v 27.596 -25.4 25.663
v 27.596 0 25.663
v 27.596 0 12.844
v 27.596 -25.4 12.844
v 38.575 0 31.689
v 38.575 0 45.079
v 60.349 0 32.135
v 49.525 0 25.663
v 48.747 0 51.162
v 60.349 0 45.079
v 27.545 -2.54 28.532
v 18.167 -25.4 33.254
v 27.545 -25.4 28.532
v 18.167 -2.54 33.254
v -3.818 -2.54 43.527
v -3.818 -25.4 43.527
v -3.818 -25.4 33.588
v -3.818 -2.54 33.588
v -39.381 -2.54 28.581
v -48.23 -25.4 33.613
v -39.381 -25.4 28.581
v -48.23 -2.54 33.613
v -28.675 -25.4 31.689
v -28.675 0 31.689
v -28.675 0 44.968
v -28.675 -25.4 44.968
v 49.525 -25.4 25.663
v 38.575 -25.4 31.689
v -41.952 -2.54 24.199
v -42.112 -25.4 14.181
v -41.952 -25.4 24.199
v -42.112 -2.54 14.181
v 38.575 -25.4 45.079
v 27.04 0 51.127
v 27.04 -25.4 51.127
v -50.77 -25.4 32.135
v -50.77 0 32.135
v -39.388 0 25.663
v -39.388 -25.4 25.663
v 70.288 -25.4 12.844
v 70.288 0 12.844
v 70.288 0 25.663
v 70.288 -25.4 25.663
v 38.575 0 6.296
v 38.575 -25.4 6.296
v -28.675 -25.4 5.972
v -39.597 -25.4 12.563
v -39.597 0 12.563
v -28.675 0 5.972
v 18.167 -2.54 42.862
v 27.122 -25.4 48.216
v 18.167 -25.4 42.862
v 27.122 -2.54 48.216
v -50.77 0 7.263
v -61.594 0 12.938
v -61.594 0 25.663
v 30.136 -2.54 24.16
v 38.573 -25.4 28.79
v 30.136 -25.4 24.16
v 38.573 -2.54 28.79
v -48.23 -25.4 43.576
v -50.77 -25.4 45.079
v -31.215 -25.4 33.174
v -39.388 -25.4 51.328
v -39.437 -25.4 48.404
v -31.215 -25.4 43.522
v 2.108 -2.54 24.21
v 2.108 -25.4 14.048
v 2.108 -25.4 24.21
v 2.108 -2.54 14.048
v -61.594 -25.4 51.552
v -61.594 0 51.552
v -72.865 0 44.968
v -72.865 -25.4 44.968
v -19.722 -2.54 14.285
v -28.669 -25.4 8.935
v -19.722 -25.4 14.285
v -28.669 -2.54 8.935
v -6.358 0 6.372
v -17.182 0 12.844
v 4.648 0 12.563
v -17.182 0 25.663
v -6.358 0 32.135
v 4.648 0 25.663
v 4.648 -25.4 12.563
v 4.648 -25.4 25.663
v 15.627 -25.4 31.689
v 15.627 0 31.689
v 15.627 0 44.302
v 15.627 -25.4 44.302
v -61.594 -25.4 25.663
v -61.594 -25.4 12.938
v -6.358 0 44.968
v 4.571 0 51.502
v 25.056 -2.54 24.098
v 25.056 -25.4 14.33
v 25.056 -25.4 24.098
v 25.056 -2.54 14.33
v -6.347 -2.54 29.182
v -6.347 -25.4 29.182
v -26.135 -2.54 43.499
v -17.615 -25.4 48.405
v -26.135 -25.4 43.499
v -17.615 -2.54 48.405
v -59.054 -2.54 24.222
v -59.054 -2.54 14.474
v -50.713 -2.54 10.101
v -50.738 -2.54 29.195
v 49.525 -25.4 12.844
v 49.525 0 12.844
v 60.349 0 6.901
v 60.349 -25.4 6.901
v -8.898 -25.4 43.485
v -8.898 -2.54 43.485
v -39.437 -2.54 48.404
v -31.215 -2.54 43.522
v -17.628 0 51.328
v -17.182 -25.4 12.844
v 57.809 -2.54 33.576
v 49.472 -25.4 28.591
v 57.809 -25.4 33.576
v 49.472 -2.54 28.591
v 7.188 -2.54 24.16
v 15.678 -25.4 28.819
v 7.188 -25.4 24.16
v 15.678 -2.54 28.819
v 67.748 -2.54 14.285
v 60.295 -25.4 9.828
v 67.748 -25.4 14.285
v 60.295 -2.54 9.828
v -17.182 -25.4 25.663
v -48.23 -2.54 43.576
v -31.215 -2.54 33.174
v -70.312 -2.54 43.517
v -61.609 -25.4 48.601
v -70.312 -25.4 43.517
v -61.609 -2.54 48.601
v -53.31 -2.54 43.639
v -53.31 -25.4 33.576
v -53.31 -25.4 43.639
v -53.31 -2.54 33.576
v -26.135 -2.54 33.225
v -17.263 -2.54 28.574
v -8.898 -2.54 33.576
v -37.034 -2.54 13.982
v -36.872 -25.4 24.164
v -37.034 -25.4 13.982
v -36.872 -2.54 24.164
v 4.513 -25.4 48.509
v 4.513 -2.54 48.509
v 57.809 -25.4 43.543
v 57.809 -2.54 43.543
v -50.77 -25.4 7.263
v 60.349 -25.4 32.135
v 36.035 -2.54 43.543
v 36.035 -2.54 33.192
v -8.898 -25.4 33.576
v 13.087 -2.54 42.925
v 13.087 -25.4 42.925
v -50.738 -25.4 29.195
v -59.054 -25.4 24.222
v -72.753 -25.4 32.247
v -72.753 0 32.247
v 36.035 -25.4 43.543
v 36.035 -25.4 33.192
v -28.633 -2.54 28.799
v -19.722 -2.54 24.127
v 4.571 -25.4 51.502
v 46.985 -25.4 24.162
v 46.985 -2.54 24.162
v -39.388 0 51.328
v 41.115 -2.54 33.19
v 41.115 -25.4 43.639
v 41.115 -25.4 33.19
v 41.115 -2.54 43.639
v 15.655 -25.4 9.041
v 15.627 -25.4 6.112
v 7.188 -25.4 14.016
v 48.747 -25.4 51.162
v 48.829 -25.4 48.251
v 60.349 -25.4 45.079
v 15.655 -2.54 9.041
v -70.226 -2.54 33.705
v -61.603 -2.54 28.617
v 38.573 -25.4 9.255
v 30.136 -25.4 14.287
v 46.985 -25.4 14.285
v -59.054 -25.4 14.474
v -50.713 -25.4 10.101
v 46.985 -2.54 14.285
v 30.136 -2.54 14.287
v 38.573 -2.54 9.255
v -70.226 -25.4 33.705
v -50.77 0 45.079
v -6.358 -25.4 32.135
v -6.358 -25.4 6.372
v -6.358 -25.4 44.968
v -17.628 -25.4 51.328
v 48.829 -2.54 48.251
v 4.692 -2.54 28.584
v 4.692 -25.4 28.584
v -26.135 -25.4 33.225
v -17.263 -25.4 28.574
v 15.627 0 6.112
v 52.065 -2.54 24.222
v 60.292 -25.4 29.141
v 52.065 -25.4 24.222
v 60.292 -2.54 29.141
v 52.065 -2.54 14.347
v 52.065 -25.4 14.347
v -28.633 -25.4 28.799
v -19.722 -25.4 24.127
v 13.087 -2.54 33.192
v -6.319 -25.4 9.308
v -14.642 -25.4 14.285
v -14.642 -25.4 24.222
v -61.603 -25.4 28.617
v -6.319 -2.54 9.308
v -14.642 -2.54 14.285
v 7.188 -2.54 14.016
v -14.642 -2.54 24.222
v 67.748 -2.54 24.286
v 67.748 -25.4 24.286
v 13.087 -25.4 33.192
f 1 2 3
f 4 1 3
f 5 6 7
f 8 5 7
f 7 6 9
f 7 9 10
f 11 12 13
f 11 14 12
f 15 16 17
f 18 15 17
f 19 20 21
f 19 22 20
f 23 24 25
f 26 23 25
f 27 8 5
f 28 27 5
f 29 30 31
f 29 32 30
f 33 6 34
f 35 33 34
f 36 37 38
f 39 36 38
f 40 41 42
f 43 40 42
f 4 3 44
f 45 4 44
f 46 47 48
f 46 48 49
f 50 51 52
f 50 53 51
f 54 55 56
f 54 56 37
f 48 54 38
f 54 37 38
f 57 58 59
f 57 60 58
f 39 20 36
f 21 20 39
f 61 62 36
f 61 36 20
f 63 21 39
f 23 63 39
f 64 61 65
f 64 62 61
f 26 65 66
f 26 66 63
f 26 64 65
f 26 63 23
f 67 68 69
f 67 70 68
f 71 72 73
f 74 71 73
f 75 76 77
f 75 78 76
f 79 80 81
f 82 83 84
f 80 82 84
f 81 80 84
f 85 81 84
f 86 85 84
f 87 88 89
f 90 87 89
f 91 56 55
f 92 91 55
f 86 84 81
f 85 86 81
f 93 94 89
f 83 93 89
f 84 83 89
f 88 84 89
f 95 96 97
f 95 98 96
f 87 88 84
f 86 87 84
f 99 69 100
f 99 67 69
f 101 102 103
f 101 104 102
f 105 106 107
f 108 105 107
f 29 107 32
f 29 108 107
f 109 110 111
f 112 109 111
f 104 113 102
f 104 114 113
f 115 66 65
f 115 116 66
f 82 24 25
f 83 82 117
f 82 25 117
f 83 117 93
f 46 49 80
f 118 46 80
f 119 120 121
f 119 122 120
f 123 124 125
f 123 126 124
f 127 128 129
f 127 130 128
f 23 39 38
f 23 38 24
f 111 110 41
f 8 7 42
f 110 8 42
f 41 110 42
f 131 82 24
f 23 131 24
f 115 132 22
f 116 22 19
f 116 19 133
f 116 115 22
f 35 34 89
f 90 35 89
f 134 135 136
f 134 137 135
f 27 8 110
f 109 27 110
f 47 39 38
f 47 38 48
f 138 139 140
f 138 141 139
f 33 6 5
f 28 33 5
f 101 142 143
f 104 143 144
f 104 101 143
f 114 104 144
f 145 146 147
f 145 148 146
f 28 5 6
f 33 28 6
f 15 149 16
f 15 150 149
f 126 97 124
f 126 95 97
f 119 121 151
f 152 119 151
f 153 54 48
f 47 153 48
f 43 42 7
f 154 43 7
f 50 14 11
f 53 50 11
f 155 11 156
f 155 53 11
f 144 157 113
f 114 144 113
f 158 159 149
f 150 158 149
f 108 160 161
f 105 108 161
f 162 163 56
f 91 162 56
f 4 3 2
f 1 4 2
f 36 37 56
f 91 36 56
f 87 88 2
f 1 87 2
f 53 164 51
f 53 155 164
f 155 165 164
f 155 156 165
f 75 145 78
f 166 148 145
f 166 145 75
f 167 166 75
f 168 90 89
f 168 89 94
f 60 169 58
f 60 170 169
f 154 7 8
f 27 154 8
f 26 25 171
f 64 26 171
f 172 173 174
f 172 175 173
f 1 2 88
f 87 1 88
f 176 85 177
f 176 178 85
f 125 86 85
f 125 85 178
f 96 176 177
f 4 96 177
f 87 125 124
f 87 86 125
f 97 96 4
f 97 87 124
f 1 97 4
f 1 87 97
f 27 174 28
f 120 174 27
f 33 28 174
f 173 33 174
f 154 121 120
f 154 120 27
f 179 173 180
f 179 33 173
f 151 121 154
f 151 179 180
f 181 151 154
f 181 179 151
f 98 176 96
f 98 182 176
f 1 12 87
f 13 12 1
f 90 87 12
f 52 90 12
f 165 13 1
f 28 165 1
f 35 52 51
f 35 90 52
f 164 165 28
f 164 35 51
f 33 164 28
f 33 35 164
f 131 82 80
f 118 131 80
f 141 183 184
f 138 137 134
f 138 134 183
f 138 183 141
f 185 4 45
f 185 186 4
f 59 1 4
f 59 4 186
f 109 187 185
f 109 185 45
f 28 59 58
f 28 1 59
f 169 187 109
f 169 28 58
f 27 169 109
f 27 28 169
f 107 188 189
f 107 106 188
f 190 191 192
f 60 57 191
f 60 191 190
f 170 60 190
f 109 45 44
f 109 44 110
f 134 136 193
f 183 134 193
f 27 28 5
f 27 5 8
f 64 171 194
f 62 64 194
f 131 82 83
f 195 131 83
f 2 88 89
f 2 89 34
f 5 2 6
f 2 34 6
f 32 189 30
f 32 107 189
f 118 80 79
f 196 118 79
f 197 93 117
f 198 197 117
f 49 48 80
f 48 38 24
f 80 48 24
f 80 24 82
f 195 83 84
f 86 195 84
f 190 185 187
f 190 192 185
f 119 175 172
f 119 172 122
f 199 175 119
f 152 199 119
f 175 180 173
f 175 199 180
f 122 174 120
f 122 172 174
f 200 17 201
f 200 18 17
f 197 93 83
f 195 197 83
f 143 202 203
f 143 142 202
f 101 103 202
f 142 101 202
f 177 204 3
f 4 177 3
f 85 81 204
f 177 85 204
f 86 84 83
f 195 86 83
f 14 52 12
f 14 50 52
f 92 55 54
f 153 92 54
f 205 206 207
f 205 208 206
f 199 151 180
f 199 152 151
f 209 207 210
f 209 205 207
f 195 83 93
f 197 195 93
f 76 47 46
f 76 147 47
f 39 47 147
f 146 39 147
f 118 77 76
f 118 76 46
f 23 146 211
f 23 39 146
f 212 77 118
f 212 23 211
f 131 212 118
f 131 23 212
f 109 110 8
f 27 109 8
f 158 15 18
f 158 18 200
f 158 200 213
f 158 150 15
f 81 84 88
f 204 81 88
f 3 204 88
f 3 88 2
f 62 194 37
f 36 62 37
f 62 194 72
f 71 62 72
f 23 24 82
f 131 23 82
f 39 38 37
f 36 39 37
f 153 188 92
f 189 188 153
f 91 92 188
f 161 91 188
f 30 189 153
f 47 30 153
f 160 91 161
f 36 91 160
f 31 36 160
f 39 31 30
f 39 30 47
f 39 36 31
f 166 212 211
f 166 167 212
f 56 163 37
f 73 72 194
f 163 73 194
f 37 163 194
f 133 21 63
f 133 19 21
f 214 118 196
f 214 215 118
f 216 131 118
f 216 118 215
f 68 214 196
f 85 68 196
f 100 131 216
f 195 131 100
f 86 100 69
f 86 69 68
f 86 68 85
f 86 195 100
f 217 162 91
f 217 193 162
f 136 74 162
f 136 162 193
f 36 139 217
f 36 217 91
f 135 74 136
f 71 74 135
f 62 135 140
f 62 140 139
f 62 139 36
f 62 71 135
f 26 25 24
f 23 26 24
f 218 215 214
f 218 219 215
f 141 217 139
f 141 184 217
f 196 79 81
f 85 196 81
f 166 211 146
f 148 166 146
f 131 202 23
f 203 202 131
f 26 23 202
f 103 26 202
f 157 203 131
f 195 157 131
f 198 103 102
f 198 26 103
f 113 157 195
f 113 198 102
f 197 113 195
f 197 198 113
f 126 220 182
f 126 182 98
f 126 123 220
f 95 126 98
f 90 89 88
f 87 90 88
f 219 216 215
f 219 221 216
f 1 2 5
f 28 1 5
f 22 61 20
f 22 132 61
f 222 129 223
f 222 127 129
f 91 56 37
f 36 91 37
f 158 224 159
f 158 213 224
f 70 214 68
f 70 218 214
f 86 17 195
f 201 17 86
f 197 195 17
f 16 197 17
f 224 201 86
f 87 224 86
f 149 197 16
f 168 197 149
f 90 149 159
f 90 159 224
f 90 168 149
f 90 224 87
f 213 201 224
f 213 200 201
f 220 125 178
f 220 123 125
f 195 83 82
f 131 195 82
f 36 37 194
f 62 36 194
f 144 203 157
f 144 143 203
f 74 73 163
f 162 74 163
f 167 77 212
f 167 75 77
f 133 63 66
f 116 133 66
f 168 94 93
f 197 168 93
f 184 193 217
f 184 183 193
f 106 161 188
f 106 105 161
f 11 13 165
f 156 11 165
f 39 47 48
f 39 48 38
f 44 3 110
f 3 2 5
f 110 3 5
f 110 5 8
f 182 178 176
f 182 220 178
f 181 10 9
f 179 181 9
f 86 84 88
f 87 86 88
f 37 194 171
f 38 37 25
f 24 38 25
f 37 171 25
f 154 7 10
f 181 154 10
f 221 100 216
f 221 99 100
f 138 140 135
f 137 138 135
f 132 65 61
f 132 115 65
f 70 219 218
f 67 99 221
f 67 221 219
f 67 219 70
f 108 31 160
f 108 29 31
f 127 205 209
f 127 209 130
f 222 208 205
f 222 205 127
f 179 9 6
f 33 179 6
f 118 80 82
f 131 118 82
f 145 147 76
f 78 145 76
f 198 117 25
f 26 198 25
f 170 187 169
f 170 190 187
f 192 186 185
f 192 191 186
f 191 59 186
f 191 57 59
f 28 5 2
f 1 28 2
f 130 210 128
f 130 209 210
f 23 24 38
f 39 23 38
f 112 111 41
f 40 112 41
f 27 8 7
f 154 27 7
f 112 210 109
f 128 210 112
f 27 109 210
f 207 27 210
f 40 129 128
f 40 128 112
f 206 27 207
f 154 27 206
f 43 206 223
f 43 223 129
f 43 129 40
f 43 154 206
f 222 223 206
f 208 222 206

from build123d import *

# Parameters (mm, degrees)
F1_DEPTH = 25.4
F2_T     = -2.54
F2_2_T   = -2.54
F2_3_T   = -2.54
F2_4_T   = -2.54
F3_DEPTH = 25.4
F4_T     = -2.54
F4_2_T   = -2.54
F5_DEPTH = 25.4
F6_T     = -2.54
F6_2_T   = -2.54
F6_3_T   = -2.54
F7_DEPTH = 25.4
F8_T     = -2.54
F8_2_T   = -2.54
F8_3_T   = -2.54


with BuildPart() as f1:
    # F0 (on Front) → F1 (new body)
    with BuildSketch(Plane.XZ):
        Polygon((-61.5940727293, 51.5516251326), (-72.864562273, 44.9678711593), (-72.7529749274, 32.2467274964), (-61.5940727293, 25.6629791111), (-50.7699437439, 32.1351401508), (-50.7699437439, 45.0794622302), align=None)
    extrude(amount=F1_DEPTH)

    # F2
    f2_openings = [f1.faces().sort_by_distance(p)[0] for p in [
        (-61.74627, -25.4, 38.618194),
    ]]
    offset(amount=F2_T, openings=f2_openings)


with BuildPart() as f1b:
    # F0 (on Front) → F1, piece 2 (new body)
    with BuildSketch(Plane.XZ):
        Polygon((60.3489740883, 32.1351401508), (49.5248446372, 25.6629791111), (49.5248446372, 12.8440149128), (60.3489740883, 6.9012749916), (70.2876925175, 12.8440149128), (70.2876925175, 25.6629791111), align=None)
    extrude(amount=F1_DEPTH)

    # F2#4
    f2_4_openings = [f1b.faces().sort_by_distance(p)[0] for p in [
        (59.954413, -25.4, 19.400246),
    ]]
    offset(amount=F2_4_T, openings=f2_4_openings)


with BuildPart() as f1c:
    # F0 (on Front) → F1, piece 3 (new body)
    with BuildSketch(Plane.XZ):
        Polygon((27.0402601768, 51.1265959709), (15.6271588057, 44.3022660911), (15.6271588057, 31.6887833178), (27.5959409939, 25.6629791111), (38.5746085251, 31.6887833178), (38.5746085251, 45.0794622302), align=None)
    extrude(amount=F1_DEPTH)

    # F2#3
    f2_3_openings = [f1c.faces().sort_by_distance(p)[0] for p in [
        (27.200622, -25.4, 38.305136),
    ]]
    offset(amount=F2_3_T, openings=f2_3_openings)


with BuildPart() as f1d:
    # F0 (on Front) → F1, piece 4 (new body)
    with BuildSketch(Plane.XZ):
        Polygon((-6.3575296663, 32.1351401508), (-17.1816591173, 25.6629791111), (-17.1816591173, 12.8440149128), (-6.3575296663, 6.3716262644), (4.6484912746, 12.5625114888), (4.6484912746, 25.6629791111), align=None)
    extrude(amount=F1_DEPTH)

    # F2#2
    f2_2_openings = [f1d.faces().sort_by_distance(p)[0] for p in [
        (-6.25016, -25.4, 19.221692),
    ]]
    offset(amount=F2_2_T, openings=f2_2_openings)


with BuildPart() as f3:
    # F0 (on Front) → F3 (new body)
    with BuildSketch(Plane.XZ):
        Polygon((-39.3878668547, 51.3284467161), (-50.7699437439, 45.0794622302), (-50.7699437439, 32.1351401508), (-39.3878668547, 25.6629791111), (-28.6753233522, 31.6887833178), (-28.6753233522, 44.9678711593), align=None)
    extrude(amount=F3_DEPTH)

    # F4
    f4_openings = [f3.faces().sort_by_distance(p)[0] for p in [
        (-39.654723, -25.4, 38.484754),
    ]]
    offset(amount=F4_T, openings=f4_openings)


with BuildPart() as f3b:
    # F0 (on Front) → F3, piece 2 (new body)
    with BuildSketch(Plane.XZ):
        Polygon((4.5707236695, 51.5022918526), (-6.3575296663, 44.9678711593), (-6.3575296663, 32.1351401508), (4.6484912746, 25.6629791111), (15.6271588057, 31.6887833178), (15.6271588057, 44.3022660911), align=None)
    extrude(amount=F3_DEPTH)

    # F4#2
    f4_2_openings = [f3b.faces().sort_by_distance(p)[0] for p in [
        (4.610916, -25.4, 38.445761),
    ]]
    offset(amount=F4_2_T, openings=f4_2_openings)


with BuildPart() as f5:
    # F0 (on Front) → F5 (new body)
    with BuildSketch(Plane.XZ):
        Polygon((-17.6280140877, 51.3284467161), (-28.6753233522, 44.9678711593), (-28.6753233522, 31.6887833178), (-17.1816591173, 25.6629791111), (-6.3575296663, 32.1351401508), (-6.3575296663, 44.9678711593), align=None)
    extrude(amount=F5_DEPTH)

    # F6#2
    f6_2_openings = [f5.faces().sort_by_distance(p)[0] for p in [
        (-17.547381, -25.4, 38.46892),
    ]]
    offset(amount=F6_2_T, openings=f6_2_openings)


with BuildPart() as f5b:
    # F0 (on Front) → F5, piece 2 (new body)
    with BuildSketch(Plane.XZ):
        Polygon((-50.7699437439, 32.1351401508), (-61.5940727293, 25.6629791111), (-61.5940727293, 12.9378493875), (-50.7699437439, 7.2630636411), (-39.5974330604, 12.5625114888), (-39.3878668547, 25.6629791111), align=None)
    extrude(amount=F5_DEPTH)

    # F6
    f6_openings = [f5b.faces().sort_by_distance(p)[0] for p in [
        (-50.529505, -25.4, 19.497361),
    ]]
    offset(amount=F6_T, openings=f6_openings)


with BuildPart() as f5c:
    # F0 (on Front) → F5, piece 3 (new body)
    with BuildSketch(Plane.XZ):
        Polygon((38.5746085251, 31.6887833178), (27.5959409939, 25.6629791111), (27.5959409939, 12.8440149128), (38.5746085251, 6.2964498767), (49.5248446372, 12.8440149128), (49.5248446372, 25.6629791111), align=None)
    extrude(amount=F5_DEPTH)

    # F6#3
    f6_3_openings = [f5c.faces().sort_by_distance(p)[0] for p in [
        (38.561952, -25.4, 19.10875),
    ]]
    offset(amount=F6_3_T, openings=f6_3_openings)


with BuildPart() as f7:
    # F0 (on Front) → F7 (new body)
    with BuildSketch(Plane.XZ):
        Polygon((-28.6753233522, 31.6887833178), (-39.3878668547, 25.6629791111), (-39.5974330604, 12.5625114888), (-28.6753233522, 5.9715134151), (-17.1816591173, 12.8440149128), (-17.1816591173, 25.6629791111), align=None)
    extrude(amount=F7_DEPTH)

    # F8
    f8_openings = [f7.faces().sort_by_distance(p)[0] for p in [
        (-28.402018, -25.4, 18.967798),
    ]]
    offset(amount=F8_T, openings=f8_openings)


with BuildPart() as f7b:
    # F0 (on Front) → F7, piece 2 (new body)
    with BuildSketch(Plane.XZ):
        Polygon((15.6271588057, 31.6887833178), (4.6484912746, 25.6629791111), (4.6484912746, 12.5625114888), (15.6271588057, 6.1115766229), (27.5959409939, 12.8440149128), (27.5959409939, 25.6629791111), align=None)
    extrude(amount=F7_DEPTH)

    # F8#2
    f8_2_openings = [f7b.faces().sort_by_distance(p)[0] for p in [
        (16.040262, -25.4, 19.027382),
    ]]
    offset(amount=F8_2_T, openings=f8_2_openings)


with BuildPart() as f7c:
    # F0 (on Front) → F7, piece 3 (new body)
    with BuildSketch(Plane.XZ):
        Polygon((48.7471123109, 51.1619913589), (38.5746085251, 45.0794622302), (38.5746085251, 31.6887833178), (49.5248446372, 25.6629791111), (60.3489740883, 32.1351401508), (60.3489740883, 45.0794622302), align=None)
    extrude(amount=F7_DEPTH)

    # F8#3
    f8_3_openings = [f7c.faces().sort_by_distance(p)[0] for p in [
        (49.385824, -25.4, 38.448957),
    ]]
    offset(amount=F8_3_T, openings=f8_3_openings)


solid = Compound([f1.part, f1b.part, f1c.part, f1d.part, f3.part, f3b.part, f5.part, f5b.part, f5c.part, f7.part, f7b.part, f7c.part])
